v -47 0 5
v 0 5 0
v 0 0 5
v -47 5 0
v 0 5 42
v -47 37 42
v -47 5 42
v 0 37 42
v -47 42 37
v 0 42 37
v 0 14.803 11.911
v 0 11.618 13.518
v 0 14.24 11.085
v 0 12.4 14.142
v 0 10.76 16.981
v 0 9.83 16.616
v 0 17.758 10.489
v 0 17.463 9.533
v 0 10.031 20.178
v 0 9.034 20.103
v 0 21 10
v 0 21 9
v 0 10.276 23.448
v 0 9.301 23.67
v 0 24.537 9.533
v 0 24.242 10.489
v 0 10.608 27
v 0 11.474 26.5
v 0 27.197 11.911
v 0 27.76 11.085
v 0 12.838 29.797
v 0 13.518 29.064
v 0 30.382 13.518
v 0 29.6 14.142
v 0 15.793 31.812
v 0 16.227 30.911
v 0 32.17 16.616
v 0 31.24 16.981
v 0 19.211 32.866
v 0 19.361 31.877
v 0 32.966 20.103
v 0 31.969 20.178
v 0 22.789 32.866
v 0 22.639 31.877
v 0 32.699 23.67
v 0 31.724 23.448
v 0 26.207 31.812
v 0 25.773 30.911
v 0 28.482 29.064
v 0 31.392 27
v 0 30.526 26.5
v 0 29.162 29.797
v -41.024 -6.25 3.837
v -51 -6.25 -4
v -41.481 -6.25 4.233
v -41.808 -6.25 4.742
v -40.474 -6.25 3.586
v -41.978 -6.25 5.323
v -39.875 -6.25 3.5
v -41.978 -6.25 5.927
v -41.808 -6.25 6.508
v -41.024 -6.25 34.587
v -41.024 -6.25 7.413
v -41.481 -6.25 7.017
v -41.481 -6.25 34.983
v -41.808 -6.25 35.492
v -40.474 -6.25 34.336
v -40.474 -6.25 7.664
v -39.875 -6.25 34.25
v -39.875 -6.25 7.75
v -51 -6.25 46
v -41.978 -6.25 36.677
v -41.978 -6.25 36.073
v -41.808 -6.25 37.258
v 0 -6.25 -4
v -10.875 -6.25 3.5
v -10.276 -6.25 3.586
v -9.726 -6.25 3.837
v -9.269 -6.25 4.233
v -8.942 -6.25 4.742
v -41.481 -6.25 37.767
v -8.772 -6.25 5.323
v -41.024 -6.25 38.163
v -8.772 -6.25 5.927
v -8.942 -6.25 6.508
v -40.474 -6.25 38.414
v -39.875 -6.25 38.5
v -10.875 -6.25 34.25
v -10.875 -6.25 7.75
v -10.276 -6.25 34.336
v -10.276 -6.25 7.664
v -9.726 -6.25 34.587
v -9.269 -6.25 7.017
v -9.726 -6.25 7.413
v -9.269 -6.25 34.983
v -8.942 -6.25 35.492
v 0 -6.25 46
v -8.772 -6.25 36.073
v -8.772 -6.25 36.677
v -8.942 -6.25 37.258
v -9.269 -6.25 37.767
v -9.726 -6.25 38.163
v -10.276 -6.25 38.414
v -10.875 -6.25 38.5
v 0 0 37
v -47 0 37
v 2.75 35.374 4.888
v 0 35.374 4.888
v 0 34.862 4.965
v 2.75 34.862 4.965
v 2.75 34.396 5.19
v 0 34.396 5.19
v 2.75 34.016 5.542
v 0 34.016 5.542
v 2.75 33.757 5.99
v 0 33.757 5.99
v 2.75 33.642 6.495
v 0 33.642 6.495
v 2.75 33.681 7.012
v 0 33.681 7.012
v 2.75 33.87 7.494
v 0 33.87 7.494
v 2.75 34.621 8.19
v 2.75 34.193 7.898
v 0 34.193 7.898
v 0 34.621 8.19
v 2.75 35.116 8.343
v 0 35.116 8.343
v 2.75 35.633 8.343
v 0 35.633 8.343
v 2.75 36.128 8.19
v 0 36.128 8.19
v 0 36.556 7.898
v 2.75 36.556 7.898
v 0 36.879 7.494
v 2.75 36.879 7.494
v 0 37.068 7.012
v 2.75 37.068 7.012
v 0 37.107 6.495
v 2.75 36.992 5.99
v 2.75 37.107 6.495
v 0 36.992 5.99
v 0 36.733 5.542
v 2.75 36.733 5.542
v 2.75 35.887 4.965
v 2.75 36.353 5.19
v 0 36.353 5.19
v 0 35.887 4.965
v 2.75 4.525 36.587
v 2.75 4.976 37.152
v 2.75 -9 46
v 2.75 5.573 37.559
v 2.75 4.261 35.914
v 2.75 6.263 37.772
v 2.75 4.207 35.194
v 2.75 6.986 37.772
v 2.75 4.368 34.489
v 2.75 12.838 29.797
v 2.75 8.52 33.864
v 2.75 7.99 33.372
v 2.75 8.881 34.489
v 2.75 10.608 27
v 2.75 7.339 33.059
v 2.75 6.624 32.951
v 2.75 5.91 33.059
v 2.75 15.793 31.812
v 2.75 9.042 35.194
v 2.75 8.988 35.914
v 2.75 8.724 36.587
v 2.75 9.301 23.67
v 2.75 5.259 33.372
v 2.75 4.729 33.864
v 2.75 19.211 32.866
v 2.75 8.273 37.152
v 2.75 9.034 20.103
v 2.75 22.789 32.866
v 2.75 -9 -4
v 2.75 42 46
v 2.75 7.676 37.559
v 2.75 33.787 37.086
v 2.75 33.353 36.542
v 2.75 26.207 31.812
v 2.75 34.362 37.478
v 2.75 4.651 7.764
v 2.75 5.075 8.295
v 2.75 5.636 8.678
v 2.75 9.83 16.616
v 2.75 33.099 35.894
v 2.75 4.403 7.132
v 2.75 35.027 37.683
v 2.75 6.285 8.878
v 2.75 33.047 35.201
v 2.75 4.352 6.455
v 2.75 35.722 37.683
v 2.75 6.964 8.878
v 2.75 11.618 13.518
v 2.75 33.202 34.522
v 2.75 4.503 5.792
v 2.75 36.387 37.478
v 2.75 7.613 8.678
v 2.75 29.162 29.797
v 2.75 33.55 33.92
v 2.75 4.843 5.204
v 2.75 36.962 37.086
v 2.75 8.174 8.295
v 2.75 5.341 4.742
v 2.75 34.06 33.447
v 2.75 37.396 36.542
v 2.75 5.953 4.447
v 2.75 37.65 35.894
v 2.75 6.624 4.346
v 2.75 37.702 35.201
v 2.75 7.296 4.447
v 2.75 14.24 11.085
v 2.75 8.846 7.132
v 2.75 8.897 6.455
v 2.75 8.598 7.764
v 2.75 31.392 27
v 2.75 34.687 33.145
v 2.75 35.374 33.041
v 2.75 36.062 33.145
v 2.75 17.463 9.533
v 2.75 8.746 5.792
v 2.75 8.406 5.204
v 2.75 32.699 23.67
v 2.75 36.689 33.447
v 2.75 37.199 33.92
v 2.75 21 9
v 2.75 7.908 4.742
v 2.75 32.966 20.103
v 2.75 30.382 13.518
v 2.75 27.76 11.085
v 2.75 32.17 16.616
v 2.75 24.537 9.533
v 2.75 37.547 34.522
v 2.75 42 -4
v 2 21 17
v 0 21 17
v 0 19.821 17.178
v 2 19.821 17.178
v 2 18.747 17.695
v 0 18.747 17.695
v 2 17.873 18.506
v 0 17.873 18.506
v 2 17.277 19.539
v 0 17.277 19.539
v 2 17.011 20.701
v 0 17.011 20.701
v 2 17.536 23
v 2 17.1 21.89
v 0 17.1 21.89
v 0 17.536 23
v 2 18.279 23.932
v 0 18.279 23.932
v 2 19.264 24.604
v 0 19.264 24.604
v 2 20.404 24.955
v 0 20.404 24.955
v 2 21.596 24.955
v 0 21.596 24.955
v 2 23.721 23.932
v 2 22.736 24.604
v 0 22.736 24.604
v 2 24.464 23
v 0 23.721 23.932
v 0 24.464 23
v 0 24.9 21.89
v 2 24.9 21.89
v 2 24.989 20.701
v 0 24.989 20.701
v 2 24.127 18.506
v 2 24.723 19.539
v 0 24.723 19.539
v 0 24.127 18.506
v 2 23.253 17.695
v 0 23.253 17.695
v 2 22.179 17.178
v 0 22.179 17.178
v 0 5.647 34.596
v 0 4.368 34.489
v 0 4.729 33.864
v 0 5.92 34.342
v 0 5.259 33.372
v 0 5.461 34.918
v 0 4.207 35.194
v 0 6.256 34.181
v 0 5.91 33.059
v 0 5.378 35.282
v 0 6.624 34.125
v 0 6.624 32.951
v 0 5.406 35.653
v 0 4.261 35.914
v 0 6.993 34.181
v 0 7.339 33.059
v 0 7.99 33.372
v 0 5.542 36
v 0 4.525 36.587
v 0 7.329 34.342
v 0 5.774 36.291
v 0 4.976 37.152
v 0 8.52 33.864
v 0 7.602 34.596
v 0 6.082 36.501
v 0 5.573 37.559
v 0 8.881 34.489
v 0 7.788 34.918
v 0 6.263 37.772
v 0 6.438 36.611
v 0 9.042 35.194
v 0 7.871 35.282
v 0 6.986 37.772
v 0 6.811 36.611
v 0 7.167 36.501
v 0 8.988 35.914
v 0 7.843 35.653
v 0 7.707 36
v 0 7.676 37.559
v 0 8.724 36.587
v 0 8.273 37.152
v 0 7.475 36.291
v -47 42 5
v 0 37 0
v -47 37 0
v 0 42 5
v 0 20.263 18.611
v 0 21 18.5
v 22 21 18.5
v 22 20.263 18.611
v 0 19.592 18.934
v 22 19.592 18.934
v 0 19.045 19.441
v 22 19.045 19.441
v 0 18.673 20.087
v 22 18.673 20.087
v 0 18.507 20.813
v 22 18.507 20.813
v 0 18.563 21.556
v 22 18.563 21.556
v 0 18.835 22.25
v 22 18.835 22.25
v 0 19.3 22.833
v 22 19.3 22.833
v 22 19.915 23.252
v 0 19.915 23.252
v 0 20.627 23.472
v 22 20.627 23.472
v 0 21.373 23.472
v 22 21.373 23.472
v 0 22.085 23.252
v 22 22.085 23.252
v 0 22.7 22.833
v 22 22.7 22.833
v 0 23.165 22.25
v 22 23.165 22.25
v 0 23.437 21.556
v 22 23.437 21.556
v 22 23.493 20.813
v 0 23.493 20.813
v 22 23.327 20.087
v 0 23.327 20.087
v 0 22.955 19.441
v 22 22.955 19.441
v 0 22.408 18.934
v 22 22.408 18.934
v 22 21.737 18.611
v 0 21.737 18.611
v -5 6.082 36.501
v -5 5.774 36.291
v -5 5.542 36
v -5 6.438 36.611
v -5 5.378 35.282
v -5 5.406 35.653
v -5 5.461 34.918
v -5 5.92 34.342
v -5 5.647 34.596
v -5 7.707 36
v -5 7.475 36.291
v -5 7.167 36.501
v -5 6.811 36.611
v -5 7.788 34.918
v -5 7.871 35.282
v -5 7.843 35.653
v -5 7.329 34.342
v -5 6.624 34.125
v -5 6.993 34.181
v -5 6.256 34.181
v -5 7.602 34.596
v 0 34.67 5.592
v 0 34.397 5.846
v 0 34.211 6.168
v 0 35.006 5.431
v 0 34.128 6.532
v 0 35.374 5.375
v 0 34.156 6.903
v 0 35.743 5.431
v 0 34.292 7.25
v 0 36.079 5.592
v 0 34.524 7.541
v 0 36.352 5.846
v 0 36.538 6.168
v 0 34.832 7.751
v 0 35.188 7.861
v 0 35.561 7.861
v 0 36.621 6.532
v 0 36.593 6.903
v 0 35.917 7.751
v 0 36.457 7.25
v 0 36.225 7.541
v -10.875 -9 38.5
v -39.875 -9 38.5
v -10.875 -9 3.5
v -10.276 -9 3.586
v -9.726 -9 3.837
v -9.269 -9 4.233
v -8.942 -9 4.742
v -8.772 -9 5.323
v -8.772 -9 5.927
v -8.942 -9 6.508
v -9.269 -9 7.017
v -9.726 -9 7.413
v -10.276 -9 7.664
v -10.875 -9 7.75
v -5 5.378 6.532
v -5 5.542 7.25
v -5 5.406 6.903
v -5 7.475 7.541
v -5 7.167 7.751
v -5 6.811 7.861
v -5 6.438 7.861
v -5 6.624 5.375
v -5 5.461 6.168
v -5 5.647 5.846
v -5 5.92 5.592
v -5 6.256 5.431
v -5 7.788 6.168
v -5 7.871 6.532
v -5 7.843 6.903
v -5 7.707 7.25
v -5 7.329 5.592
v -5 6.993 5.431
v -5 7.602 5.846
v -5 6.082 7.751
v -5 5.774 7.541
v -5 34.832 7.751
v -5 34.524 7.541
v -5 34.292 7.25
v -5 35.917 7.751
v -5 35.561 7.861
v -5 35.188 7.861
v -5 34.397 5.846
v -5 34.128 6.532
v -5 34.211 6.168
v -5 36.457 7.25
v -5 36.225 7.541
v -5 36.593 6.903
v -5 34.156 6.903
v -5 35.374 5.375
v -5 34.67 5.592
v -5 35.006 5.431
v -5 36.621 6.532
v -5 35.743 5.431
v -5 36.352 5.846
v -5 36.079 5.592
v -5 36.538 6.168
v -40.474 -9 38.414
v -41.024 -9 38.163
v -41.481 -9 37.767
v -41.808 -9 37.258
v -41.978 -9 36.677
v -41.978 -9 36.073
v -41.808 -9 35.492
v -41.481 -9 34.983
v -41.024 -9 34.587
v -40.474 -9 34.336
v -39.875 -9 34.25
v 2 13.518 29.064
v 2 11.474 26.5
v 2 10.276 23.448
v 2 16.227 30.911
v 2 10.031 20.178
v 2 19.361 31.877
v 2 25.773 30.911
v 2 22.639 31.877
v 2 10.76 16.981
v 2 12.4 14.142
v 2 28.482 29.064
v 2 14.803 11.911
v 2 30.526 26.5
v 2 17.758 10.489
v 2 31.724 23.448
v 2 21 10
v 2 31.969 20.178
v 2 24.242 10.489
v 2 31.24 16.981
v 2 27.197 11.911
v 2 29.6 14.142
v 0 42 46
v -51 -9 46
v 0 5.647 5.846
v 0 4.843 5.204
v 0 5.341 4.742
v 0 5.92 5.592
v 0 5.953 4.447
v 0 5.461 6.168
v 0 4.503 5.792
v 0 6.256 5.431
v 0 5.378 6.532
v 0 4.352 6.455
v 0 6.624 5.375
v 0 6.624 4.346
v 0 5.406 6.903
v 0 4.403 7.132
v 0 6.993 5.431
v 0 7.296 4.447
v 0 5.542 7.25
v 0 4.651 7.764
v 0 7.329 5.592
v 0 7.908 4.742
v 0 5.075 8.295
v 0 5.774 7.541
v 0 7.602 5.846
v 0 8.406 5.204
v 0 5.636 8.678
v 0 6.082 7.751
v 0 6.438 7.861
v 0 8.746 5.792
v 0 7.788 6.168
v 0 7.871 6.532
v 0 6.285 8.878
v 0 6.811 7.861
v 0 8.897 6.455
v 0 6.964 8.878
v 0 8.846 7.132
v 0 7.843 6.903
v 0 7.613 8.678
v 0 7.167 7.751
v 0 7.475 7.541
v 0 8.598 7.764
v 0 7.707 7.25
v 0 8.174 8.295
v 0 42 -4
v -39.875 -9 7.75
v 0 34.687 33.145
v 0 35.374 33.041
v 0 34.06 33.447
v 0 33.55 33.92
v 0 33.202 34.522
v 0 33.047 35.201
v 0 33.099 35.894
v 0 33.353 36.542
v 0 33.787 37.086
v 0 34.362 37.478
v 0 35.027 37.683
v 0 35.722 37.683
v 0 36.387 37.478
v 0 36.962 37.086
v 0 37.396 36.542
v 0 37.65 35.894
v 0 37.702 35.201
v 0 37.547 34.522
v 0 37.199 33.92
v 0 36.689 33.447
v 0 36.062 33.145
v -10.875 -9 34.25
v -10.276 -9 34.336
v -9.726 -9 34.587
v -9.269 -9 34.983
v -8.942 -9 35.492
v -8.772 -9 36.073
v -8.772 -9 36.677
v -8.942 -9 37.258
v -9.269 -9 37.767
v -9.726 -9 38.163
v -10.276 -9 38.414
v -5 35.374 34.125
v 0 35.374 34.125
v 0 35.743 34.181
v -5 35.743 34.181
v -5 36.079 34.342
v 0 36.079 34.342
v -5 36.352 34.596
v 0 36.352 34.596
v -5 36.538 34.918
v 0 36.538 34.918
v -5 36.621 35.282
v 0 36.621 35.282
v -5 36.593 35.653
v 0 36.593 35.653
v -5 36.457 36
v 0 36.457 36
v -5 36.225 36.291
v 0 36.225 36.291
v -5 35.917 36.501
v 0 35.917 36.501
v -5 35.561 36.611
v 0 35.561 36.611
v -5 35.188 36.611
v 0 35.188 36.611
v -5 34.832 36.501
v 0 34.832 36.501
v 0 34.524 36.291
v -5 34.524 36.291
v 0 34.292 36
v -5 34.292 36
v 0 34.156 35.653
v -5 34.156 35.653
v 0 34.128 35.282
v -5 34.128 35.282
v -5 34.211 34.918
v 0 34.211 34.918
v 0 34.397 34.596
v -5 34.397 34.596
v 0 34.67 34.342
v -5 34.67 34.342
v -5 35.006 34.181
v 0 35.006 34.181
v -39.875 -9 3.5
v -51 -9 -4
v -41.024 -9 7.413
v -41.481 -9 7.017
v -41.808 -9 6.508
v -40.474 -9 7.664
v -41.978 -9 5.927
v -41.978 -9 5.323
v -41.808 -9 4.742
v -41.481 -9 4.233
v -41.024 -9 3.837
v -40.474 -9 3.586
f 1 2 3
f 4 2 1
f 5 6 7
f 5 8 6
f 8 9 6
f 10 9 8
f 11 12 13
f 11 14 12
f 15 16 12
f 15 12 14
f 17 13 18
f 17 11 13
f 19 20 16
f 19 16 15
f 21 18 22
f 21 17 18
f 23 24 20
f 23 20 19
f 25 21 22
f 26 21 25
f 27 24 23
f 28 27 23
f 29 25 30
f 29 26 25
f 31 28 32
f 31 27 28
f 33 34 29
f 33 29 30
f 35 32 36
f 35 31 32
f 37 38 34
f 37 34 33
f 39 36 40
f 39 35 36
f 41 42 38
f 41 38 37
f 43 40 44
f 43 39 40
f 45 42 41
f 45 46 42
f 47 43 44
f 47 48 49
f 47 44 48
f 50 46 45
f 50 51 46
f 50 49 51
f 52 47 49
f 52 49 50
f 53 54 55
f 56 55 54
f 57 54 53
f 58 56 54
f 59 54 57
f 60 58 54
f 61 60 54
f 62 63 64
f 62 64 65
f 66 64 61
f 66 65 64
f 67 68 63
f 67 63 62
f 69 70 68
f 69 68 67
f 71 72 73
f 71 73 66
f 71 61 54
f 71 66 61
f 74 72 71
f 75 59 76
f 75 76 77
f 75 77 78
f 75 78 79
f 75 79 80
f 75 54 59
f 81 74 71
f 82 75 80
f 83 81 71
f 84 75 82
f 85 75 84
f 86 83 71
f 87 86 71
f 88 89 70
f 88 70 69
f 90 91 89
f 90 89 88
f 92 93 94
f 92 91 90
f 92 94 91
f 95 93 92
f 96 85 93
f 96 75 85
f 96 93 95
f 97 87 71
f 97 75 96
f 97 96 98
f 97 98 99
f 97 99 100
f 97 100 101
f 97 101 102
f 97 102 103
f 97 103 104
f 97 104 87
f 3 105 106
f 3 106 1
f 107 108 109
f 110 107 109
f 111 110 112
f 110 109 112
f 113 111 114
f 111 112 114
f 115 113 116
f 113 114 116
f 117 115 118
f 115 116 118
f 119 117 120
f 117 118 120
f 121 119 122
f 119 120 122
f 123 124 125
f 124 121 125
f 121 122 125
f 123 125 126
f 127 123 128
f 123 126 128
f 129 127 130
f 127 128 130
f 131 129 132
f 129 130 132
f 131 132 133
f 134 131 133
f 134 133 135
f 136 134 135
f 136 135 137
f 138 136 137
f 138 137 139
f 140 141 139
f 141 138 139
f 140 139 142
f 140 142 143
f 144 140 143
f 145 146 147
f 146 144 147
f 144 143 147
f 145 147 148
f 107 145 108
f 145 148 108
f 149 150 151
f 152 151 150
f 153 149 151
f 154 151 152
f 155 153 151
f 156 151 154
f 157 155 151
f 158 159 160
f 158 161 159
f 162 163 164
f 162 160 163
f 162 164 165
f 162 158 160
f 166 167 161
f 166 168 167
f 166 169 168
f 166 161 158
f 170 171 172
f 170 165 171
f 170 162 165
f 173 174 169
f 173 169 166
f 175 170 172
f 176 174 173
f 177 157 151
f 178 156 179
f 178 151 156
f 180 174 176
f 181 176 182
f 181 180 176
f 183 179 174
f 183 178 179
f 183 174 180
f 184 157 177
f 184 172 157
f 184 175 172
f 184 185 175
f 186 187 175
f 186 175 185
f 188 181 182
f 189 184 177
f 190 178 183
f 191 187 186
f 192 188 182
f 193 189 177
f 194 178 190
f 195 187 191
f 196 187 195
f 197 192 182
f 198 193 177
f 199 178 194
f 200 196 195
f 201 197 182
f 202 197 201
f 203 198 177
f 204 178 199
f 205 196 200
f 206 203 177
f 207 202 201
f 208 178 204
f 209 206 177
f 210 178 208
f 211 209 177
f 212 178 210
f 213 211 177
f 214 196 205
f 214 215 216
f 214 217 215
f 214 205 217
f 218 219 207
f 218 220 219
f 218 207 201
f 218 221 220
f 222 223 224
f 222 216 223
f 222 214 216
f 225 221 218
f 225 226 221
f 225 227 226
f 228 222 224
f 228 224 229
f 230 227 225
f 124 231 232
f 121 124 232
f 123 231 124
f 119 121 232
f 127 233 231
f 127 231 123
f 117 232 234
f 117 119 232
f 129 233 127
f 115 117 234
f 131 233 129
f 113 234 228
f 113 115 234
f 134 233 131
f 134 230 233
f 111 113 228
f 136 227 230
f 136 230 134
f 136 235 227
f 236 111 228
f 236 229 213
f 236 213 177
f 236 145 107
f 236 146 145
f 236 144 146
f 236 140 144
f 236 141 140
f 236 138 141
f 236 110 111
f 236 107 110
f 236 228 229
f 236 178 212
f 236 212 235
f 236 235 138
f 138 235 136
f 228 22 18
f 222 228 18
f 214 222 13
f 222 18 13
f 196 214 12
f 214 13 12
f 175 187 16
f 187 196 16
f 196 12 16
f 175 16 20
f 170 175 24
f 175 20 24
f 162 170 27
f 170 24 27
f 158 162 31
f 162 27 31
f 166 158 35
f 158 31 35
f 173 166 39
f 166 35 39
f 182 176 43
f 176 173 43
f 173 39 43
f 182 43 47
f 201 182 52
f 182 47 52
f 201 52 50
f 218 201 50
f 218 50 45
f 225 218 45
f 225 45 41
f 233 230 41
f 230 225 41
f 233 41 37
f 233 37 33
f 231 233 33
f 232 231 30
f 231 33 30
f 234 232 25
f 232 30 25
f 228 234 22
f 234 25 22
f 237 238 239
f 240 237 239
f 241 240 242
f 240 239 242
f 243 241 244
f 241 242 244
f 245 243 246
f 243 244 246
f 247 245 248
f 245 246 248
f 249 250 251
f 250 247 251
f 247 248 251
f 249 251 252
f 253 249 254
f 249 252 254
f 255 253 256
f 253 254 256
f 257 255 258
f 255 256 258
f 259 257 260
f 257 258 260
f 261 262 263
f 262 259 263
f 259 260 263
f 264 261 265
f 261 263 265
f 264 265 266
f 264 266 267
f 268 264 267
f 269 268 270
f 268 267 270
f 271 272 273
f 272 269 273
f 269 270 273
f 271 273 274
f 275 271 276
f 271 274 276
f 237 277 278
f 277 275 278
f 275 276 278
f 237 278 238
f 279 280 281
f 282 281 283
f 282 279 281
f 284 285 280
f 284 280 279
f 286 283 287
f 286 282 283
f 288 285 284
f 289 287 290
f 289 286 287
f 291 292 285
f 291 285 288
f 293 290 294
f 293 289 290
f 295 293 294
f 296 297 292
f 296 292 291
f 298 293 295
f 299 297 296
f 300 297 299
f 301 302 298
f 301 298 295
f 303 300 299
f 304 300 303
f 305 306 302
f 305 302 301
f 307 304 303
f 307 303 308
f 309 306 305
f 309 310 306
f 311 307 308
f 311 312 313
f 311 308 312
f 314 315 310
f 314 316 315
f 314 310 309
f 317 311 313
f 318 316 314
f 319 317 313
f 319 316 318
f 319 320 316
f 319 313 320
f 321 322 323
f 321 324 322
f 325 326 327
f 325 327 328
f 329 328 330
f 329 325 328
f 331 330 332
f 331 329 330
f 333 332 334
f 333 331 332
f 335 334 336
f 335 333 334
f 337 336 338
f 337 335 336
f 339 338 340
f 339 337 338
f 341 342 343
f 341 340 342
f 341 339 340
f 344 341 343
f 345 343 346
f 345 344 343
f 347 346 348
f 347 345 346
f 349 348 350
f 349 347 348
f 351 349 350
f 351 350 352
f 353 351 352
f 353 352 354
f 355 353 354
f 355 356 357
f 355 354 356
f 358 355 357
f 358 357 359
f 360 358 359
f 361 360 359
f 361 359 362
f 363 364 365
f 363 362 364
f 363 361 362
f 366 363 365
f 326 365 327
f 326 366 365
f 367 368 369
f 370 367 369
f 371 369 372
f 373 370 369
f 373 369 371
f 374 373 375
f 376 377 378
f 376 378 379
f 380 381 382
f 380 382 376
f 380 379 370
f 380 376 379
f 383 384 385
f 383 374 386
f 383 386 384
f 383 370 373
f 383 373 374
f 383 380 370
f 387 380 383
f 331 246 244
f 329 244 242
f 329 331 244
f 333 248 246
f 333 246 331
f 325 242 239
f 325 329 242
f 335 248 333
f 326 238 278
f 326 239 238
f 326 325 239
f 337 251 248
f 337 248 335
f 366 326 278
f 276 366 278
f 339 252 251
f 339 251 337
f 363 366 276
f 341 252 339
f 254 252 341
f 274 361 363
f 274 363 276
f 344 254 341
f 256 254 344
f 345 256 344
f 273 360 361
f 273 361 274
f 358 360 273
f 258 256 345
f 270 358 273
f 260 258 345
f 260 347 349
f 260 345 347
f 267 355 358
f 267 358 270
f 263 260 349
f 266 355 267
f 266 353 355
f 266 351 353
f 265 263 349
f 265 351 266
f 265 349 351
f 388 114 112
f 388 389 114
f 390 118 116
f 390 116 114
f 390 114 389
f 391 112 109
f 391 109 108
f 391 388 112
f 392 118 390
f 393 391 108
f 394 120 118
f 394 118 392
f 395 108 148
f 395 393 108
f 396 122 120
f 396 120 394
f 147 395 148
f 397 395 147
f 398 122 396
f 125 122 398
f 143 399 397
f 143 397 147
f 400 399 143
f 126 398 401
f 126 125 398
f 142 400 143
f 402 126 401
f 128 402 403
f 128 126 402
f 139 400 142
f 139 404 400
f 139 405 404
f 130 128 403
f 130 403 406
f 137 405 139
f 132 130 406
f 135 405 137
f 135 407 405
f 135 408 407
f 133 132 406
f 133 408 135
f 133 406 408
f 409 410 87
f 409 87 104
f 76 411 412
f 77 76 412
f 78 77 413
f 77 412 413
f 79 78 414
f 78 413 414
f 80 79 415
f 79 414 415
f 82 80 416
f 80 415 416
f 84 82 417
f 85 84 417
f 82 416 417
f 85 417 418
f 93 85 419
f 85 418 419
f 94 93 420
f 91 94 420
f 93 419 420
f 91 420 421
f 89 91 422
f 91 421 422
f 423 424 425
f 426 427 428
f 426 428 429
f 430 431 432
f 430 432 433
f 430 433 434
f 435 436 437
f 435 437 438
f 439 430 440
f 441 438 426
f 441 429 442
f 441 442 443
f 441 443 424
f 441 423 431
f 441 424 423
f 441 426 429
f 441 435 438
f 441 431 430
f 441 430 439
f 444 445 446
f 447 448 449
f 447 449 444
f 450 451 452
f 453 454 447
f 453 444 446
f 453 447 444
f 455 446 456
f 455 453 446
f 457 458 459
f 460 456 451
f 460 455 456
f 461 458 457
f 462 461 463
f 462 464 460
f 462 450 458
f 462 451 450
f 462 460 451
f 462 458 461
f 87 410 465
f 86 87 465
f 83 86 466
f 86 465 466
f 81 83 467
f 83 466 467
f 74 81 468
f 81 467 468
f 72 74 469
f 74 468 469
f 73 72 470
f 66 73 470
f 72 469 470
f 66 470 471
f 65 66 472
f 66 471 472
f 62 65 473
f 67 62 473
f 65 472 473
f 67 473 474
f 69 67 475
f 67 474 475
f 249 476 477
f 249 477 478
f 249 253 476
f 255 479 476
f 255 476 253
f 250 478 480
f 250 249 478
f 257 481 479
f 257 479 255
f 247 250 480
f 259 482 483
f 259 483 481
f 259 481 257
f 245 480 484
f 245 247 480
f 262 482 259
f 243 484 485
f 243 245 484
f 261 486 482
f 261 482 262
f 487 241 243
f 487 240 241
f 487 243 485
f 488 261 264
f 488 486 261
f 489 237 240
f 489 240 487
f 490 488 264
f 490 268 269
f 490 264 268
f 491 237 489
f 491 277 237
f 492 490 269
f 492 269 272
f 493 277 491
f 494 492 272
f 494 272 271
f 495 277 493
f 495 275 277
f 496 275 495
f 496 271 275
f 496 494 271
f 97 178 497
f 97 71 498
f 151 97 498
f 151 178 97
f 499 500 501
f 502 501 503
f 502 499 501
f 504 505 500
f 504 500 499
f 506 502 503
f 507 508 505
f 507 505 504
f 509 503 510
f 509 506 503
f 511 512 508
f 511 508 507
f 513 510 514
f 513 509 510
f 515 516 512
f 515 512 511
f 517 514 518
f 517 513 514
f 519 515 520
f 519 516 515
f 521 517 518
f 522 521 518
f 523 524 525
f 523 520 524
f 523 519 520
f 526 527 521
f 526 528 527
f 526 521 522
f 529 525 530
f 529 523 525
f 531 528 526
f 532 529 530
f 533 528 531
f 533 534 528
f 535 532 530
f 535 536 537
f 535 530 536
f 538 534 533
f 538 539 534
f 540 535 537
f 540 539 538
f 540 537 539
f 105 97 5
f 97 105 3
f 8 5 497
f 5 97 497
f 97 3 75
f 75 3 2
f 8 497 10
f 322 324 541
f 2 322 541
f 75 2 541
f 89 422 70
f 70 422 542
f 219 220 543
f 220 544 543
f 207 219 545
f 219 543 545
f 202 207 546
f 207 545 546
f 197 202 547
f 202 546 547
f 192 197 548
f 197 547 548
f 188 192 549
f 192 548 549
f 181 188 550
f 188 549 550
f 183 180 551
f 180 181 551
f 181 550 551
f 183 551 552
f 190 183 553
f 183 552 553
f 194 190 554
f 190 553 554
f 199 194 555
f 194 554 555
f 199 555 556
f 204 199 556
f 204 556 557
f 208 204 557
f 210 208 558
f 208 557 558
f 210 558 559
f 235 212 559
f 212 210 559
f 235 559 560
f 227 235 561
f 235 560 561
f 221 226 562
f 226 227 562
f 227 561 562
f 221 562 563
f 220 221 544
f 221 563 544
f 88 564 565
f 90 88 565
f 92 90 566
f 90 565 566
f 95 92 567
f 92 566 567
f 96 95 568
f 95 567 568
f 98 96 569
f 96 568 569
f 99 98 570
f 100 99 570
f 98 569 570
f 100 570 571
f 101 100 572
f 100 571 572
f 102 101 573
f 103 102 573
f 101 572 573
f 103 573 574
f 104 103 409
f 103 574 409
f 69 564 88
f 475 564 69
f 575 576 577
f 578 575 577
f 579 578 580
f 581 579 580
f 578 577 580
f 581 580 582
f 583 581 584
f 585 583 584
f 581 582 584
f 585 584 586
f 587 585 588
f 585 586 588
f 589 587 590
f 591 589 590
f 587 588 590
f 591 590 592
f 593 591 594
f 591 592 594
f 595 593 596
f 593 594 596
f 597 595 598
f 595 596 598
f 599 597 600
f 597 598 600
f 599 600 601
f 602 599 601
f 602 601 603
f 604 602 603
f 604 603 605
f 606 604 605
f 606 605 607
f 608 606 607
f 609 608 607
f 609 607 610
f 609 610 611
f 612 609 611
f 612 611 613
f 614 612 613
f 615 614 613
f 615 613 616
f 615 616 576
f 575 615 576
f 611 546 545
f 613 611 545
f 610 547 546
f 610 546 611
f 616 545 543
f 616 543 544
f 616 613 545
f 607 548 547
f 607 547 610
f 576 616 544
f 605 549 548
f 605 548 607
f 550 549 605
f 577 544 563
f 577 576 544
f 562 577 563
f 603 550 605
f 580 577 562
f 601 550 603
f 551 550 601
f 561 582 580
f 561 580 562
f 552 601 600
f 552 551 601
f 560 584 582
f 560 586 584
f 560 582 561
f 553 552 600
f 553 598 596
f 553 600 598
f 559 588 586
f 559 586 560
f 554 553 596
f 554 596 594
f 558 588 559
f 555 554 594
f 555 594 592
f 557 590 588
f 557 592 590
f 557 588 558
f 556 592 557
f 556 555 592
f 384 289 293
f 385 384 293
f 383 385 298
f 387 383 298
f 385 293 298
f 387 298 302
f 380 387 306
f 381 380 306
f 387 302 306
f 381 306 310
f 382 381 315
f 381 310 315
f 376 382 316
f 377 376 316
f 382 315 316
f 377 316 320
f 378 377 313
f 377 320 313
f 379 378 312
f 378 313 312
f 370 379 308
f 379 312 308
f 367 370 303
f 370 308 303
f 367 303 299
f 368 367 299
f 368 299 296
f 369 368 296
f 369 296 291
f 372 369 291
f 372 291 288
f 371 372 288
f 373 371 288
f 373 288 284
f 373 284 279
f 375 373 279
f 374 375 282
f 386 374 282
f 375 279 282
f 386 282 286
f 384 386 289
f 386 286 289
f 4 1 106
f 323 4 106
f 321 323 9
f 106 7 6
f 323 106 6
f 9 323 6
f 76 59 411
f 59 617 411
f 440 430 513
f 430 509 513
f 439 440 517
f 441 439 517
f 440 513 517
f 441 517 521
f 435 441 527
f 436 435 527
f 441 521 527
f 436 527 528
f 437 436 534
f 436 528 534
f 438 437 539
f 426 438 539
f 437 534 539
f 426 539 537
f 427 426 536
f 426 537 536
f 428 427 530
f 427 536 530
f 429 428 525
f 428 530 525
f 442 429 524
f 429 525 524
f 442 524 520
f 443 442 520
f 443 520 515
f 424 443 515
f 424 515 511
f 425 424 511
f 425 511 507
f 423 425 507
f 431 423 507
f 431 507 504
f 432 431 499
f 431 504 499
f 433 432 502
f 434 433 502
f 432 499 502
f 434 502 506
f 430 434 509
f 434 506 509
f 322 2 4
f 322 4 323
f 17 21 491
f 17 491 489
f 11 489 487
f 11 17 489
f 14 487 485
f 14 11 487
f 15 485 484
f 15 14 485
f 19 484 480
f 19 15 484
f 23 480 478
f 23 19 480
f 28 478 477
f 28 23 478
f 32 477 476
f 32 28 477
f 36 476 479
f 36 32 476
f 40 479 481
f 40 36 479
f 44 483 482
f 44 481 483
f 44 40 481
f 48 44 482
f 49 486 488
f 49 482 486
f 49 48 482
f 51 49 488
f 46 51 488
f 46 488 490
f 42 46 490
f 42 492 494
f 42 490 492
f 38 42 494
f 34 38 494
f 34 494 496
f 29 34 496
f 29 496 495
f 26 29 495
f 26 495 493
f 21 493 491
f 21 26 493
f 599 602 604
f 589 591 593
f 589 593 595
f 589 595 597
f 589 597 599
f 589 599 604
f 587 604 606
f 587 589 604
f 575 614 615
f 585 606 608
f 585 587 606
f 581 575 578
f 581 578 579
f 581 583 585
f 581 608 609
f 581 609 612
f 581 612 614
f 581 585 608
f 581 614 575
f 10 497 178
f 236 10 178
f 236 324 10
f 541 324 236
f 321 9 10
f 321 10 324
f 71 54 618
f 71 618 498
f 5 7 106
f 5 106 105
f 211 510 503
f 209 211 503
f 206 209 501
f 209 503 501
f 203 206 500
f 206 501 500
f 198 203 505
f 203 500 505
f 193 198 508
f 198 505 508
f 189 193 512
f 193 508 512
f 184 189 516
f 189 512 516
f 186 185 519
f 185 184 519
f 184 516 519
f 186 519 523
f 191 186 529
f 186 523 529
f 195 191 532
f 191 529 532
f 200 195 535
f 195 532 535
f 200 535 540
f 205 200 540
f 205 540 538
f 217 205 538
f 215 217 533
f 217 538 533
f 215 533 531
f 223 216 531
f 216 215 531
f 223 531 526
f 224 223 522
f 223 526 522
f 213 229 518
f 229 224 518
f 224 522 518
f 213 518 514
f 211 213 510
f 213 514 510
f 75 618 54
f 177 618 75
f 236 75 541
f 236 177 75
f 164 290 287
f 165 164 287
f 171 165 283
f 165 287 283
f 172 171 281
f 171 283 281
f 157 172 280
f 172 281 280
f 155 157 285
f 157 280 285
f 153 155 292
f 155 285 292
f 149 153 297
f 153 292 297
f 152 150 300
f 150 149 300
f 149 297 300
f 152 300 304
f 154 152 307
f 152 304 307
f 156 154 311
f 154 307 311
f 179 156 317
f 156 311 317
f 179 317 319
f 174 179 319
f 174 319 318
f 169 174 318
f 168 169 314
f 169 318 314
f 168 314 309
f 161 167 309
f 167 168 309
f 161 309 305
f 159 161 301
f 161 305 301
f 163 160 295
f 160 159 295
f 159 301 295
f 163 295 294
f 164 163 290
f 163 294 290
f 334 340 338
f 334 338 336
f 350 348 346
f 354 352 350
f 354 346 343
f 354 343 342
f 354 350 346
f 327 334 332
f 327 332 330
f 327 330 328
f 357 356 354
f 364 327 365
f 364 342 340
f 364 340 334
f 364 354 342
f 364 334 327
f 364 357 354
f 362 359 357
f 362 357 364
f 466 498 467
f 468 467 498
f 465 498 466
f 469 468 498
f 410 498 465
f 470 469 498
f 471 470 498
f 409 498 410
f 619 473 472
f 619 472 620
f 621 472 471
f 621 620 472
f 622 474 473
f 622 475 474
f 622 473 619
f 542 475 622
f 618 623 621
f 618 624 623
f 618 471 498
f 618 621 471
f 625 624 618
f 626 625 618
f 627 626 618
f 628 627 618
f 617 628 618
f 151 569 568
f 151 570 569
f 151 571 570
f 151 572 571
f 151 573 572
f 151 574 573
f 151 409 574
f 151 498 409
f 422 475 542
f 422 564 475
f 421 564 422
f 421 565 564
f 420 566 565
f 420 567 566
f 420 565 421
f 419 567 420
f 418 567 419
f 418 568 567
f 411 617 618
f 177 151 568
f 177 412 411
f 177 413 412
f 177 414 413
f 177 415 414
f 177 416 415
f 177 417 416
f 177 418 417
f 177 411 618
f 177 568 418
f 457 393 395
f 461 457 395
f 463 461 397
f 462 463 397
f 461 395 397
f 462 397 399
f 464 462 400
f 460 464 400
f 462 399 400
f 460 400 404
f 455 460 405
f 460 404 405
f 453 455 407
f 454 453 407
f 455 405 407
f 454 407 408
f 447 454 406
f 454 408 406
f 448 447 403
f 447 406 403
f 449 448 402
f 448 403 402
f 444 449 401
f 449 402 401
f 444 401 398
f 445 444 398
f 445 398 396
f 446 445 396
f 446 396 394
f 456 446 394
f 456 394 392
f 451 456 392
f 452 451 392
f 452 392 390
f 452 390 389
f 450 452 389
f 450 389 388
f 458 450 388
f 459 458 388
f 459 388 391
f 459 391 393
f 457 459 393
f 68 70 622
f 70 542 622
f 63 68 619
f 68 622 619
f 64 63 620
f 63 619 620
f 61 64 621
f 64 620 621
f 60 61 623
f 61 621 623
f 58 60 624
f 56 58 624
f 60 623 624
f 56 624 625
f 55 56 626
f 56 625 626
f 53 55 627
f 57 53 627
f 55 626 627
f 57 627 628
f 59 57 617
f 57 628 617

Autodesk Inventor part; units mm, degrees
ref_plane "YZ Plane" through (0, 0, 0) normal (1, 0, 0) x (0, 1, 0)
ref_plane "XZ Plane" through (0, 0, 0) normal (0, 1, 0) x (-1, 0, 0)
ref_plane "XY Plane" through (0, 0, 0) normal (0, 0, 1) x (1, 0, 0)
sketch "Sketch1" plane through (0, 0, 0) normal (1, 0, 0) x (0, 1, 0)
  line L0 (0, 0) -> (42, 0)
  line L1 (42, 0) -> (42, 42)
  line L2 (42, 42) -> (0, 42)
  line L3 (0, 42) -> (0, 0)
  dimension "d0" = 42
  dimension "d1" = 42
extrude "Extrusion1" add sketch "Sketch1" against normal blind 47
sketch "Sketch2" plane through (0, 0, 0) normal (1, 0, 0) x (0, 0, -1)
  line L0 (-42, 42) -> (0, 42) construction
  line L1 (-21, 42) -> (-21, 0) construction
  line L2 (0, 0) -> (-42, 0) construction
  circle A0 centre (-21, 21) radius 11
  circle A1 centre (-21, 21) radius 4
  dimension "d4" = 22
  dimension "d5" = 8
extrude "Extrusion2" add sketch "Sketch2" along normal blind 2
sketch "Sketch3" plane through (0, 21, 21) normal (1, 0, 0) x (0, 0, -1)
  circle A0 centre (0, 0) radius 4 projected
  circle A1 centre (0, 0) radius 2.5
  point P0 (21, -21)
  dimension "d8" = 5
extrude "Extrusion3" add sketch "Sketch3" along normal blind 22 contours A1
chamfer "Chamfer1" distance 5 angle 45 4 edges at (-23.5, 42, 42) (-23.5, 42, 0) (-23.5, 0, 42) (-23.5, 0, 0)
sketch "Sketch4" plane through (0, 0, 0) normal (1, 0, 0) x (0, 0, -1)
  line L0 (-35.375, 35.3745) -> (-6.625, 35.3745) construction
  line L1 (-6.625, 35.3745) -> (-6.625, 6.6245) construction
  line L2 (-6.625, 6.6245) -> (-35.375, 6.6245) construction
  line L3 (-35.375, 6.6245) -> (-35.375, 35.3745) construction
  line L4 (-42, 37) -> (-42, 5) construction
  line L5 (-5, 42) -> (-37, 42) construction
  circle A0 centre (-6.625, 35.3745) radius 1.25
  circle A1 centre (-35.375, 35.3745) radius 1.25
  circle A2 centre (-35.375, 6.6245) radius 1.25
  circle A3 centre (-6.625, 6.6245) radius 1.25
  point P0 (0, 0)
  dimension "d14" = 28.75
  dimension "d15" = 28.75
  dimension "d16" = 6.625
  dimension "d17" = 6.6255
  dimension "d18" = 2.5
  dimension "d19" = 2.5
  dimension "d20" = 2.5
  dimension "d21" = 2.5
extrude "Extrusion4" cut sketch "Sketch4" against normal blind 5
sketch "Sketch5" plane through (0, 0, 0) normal (1, 0, 0) x (0, 0, -1)
  line L0 (-46, 42) -> (4, 42)
  line L1 (4, 42) -> (4, -9)
  line L2 (4, -9) -> (-46, -9)
  line L3 (-46, -9) -> (-46, 42)
  line L4 (-5, 42) -> (-37, 42) construction
  line L5 (-42, 37) -> (-42, 5) construction
  circle A0 centre (-21, 21) radius 11 projected
  circle A1 centre (-35.375, 35.3745) radius 1.25 projected
  circle A2 centre (-6.625, 35.3745) radius 1.25 projected
  circle A3 centre (-6.625, 6.6245) radius 1.25 projected
  circle A4 centre (-35.375, 6.6245) radius 1.25 projected
  circle A5 centre (-35.375, 35.3745) radius 2.3338
  circle A6 centre (-6.625, 35.3745) radius 1.7372
  circle A7 centre (-35.375, 6.6245) radius 2.4239
  circle A8 centre (-6.625, 6.6245) radius 2.2788
  circle A9 centre (-21, 21) radius 12
  point P0 (0, 0)
  dimension "d24" = 50
  dimension "d25" = 51
  dimension "d26" = 4
  dimension "d27" = 0
  dimension "d28" = 1.0838
  dimension "d29" = 0.4872
  dimension "d30" = 1.1739
  dimension "d31" = 1.0288
  dimension "d32" = 1
extrude "Extrusion5" add sketch "Sketch5" along normal blind 2.75 contours L0 L1 L2 L3
sketch "Sketch6" plane through (0, 0, 0) normal (-1, 0, 0) x (0, 0, 1)
  line L0 (42, 37) -> (37, 42) projected
  line L1 (42, 37) -> (42, 5) projected
  line L2 (37, 0) -> (42, 5) projected
  line L3 (37, 0) -> (5, 0) projected
  line L4 (0, 5) -> (5, 0) projected
  line L5 (0, 5) -> (0, 37) projected
  line L6 (5, 42) -> (0, 37) projected
  line L7 (-4, 42) -> (5, 42) projected
  line L8 (-4, -9) -> (-4, 42) projected
  line L9 (46, -9) -> (-4, -9) projected
  line L10 (46, 42) -> (46, -9) projected
  line L11 (37, 42) -> (46, 42) projected
  line L12 (-4, -6.25) -> (46, -6.25)
  line L13 (46, 42) -> (46, -9) projected
  point P0 (0, 0)
  dimension "d35" = 2.75
extrude "Extrusion6" add sketch "Sketch6" along normal blind 51 contours L10 L9 L8 L12
sketch "Sketch7" plane through (2.75, -9, -4) normal (0, -1, 0) x (1, 0, 0)
  line L0 (-42.625, 9.625) -> (-13.625, 9.625) construction
  line L1 (-42.625, 7.5) -> (-13.625, 7.5)
  line L2 (-13.625, 11.75) -> (-42.625, 11.75)
  arc A0 (-42.625, 11.75) -> (-42.625, 7.5) centre (-42.625, 9.625) ccw
  arc A1 (-13.625, 7.5) -> (-13.625, 11.75) centre (-13.625, 9.625) ccw
  line L3 (-53.75, 0) -> (0, 0) projected
  line L4 (-53.75, 0) -> (-53.75, 50) projected
  line L5 (-53.75, 25) -> (0, 25) construction
  line L6 (0, 50) -> (0, 0) construction
  line L7 (-42.625, 42.5) -> (-13.625, 42.5)
  line L8 (-13.625, 38.25) -> (-42.625, 38.25)
  arc A2 (-42.625, 42.5) -> (-42.625, 38.25) centre (-42.625, 40.375) ccw
  arc A3 (-13.625, 38.25) -> (-13.625, 42.5) centre (-13.625, 40.375) ccw
  point P0 (-2.75, 4)
  point P1 (-28.125, 9.625)
  dimension "d38" = 29
  dimension "d39" = 4.25
  dimension "d40" = 7.5
  dimension "d41" = 11.125
extrude "Extrusion7" cut sketch "Sketch7" against normal up to next
properties part number "Nema 17 CNC Kit Stepper Motor"
